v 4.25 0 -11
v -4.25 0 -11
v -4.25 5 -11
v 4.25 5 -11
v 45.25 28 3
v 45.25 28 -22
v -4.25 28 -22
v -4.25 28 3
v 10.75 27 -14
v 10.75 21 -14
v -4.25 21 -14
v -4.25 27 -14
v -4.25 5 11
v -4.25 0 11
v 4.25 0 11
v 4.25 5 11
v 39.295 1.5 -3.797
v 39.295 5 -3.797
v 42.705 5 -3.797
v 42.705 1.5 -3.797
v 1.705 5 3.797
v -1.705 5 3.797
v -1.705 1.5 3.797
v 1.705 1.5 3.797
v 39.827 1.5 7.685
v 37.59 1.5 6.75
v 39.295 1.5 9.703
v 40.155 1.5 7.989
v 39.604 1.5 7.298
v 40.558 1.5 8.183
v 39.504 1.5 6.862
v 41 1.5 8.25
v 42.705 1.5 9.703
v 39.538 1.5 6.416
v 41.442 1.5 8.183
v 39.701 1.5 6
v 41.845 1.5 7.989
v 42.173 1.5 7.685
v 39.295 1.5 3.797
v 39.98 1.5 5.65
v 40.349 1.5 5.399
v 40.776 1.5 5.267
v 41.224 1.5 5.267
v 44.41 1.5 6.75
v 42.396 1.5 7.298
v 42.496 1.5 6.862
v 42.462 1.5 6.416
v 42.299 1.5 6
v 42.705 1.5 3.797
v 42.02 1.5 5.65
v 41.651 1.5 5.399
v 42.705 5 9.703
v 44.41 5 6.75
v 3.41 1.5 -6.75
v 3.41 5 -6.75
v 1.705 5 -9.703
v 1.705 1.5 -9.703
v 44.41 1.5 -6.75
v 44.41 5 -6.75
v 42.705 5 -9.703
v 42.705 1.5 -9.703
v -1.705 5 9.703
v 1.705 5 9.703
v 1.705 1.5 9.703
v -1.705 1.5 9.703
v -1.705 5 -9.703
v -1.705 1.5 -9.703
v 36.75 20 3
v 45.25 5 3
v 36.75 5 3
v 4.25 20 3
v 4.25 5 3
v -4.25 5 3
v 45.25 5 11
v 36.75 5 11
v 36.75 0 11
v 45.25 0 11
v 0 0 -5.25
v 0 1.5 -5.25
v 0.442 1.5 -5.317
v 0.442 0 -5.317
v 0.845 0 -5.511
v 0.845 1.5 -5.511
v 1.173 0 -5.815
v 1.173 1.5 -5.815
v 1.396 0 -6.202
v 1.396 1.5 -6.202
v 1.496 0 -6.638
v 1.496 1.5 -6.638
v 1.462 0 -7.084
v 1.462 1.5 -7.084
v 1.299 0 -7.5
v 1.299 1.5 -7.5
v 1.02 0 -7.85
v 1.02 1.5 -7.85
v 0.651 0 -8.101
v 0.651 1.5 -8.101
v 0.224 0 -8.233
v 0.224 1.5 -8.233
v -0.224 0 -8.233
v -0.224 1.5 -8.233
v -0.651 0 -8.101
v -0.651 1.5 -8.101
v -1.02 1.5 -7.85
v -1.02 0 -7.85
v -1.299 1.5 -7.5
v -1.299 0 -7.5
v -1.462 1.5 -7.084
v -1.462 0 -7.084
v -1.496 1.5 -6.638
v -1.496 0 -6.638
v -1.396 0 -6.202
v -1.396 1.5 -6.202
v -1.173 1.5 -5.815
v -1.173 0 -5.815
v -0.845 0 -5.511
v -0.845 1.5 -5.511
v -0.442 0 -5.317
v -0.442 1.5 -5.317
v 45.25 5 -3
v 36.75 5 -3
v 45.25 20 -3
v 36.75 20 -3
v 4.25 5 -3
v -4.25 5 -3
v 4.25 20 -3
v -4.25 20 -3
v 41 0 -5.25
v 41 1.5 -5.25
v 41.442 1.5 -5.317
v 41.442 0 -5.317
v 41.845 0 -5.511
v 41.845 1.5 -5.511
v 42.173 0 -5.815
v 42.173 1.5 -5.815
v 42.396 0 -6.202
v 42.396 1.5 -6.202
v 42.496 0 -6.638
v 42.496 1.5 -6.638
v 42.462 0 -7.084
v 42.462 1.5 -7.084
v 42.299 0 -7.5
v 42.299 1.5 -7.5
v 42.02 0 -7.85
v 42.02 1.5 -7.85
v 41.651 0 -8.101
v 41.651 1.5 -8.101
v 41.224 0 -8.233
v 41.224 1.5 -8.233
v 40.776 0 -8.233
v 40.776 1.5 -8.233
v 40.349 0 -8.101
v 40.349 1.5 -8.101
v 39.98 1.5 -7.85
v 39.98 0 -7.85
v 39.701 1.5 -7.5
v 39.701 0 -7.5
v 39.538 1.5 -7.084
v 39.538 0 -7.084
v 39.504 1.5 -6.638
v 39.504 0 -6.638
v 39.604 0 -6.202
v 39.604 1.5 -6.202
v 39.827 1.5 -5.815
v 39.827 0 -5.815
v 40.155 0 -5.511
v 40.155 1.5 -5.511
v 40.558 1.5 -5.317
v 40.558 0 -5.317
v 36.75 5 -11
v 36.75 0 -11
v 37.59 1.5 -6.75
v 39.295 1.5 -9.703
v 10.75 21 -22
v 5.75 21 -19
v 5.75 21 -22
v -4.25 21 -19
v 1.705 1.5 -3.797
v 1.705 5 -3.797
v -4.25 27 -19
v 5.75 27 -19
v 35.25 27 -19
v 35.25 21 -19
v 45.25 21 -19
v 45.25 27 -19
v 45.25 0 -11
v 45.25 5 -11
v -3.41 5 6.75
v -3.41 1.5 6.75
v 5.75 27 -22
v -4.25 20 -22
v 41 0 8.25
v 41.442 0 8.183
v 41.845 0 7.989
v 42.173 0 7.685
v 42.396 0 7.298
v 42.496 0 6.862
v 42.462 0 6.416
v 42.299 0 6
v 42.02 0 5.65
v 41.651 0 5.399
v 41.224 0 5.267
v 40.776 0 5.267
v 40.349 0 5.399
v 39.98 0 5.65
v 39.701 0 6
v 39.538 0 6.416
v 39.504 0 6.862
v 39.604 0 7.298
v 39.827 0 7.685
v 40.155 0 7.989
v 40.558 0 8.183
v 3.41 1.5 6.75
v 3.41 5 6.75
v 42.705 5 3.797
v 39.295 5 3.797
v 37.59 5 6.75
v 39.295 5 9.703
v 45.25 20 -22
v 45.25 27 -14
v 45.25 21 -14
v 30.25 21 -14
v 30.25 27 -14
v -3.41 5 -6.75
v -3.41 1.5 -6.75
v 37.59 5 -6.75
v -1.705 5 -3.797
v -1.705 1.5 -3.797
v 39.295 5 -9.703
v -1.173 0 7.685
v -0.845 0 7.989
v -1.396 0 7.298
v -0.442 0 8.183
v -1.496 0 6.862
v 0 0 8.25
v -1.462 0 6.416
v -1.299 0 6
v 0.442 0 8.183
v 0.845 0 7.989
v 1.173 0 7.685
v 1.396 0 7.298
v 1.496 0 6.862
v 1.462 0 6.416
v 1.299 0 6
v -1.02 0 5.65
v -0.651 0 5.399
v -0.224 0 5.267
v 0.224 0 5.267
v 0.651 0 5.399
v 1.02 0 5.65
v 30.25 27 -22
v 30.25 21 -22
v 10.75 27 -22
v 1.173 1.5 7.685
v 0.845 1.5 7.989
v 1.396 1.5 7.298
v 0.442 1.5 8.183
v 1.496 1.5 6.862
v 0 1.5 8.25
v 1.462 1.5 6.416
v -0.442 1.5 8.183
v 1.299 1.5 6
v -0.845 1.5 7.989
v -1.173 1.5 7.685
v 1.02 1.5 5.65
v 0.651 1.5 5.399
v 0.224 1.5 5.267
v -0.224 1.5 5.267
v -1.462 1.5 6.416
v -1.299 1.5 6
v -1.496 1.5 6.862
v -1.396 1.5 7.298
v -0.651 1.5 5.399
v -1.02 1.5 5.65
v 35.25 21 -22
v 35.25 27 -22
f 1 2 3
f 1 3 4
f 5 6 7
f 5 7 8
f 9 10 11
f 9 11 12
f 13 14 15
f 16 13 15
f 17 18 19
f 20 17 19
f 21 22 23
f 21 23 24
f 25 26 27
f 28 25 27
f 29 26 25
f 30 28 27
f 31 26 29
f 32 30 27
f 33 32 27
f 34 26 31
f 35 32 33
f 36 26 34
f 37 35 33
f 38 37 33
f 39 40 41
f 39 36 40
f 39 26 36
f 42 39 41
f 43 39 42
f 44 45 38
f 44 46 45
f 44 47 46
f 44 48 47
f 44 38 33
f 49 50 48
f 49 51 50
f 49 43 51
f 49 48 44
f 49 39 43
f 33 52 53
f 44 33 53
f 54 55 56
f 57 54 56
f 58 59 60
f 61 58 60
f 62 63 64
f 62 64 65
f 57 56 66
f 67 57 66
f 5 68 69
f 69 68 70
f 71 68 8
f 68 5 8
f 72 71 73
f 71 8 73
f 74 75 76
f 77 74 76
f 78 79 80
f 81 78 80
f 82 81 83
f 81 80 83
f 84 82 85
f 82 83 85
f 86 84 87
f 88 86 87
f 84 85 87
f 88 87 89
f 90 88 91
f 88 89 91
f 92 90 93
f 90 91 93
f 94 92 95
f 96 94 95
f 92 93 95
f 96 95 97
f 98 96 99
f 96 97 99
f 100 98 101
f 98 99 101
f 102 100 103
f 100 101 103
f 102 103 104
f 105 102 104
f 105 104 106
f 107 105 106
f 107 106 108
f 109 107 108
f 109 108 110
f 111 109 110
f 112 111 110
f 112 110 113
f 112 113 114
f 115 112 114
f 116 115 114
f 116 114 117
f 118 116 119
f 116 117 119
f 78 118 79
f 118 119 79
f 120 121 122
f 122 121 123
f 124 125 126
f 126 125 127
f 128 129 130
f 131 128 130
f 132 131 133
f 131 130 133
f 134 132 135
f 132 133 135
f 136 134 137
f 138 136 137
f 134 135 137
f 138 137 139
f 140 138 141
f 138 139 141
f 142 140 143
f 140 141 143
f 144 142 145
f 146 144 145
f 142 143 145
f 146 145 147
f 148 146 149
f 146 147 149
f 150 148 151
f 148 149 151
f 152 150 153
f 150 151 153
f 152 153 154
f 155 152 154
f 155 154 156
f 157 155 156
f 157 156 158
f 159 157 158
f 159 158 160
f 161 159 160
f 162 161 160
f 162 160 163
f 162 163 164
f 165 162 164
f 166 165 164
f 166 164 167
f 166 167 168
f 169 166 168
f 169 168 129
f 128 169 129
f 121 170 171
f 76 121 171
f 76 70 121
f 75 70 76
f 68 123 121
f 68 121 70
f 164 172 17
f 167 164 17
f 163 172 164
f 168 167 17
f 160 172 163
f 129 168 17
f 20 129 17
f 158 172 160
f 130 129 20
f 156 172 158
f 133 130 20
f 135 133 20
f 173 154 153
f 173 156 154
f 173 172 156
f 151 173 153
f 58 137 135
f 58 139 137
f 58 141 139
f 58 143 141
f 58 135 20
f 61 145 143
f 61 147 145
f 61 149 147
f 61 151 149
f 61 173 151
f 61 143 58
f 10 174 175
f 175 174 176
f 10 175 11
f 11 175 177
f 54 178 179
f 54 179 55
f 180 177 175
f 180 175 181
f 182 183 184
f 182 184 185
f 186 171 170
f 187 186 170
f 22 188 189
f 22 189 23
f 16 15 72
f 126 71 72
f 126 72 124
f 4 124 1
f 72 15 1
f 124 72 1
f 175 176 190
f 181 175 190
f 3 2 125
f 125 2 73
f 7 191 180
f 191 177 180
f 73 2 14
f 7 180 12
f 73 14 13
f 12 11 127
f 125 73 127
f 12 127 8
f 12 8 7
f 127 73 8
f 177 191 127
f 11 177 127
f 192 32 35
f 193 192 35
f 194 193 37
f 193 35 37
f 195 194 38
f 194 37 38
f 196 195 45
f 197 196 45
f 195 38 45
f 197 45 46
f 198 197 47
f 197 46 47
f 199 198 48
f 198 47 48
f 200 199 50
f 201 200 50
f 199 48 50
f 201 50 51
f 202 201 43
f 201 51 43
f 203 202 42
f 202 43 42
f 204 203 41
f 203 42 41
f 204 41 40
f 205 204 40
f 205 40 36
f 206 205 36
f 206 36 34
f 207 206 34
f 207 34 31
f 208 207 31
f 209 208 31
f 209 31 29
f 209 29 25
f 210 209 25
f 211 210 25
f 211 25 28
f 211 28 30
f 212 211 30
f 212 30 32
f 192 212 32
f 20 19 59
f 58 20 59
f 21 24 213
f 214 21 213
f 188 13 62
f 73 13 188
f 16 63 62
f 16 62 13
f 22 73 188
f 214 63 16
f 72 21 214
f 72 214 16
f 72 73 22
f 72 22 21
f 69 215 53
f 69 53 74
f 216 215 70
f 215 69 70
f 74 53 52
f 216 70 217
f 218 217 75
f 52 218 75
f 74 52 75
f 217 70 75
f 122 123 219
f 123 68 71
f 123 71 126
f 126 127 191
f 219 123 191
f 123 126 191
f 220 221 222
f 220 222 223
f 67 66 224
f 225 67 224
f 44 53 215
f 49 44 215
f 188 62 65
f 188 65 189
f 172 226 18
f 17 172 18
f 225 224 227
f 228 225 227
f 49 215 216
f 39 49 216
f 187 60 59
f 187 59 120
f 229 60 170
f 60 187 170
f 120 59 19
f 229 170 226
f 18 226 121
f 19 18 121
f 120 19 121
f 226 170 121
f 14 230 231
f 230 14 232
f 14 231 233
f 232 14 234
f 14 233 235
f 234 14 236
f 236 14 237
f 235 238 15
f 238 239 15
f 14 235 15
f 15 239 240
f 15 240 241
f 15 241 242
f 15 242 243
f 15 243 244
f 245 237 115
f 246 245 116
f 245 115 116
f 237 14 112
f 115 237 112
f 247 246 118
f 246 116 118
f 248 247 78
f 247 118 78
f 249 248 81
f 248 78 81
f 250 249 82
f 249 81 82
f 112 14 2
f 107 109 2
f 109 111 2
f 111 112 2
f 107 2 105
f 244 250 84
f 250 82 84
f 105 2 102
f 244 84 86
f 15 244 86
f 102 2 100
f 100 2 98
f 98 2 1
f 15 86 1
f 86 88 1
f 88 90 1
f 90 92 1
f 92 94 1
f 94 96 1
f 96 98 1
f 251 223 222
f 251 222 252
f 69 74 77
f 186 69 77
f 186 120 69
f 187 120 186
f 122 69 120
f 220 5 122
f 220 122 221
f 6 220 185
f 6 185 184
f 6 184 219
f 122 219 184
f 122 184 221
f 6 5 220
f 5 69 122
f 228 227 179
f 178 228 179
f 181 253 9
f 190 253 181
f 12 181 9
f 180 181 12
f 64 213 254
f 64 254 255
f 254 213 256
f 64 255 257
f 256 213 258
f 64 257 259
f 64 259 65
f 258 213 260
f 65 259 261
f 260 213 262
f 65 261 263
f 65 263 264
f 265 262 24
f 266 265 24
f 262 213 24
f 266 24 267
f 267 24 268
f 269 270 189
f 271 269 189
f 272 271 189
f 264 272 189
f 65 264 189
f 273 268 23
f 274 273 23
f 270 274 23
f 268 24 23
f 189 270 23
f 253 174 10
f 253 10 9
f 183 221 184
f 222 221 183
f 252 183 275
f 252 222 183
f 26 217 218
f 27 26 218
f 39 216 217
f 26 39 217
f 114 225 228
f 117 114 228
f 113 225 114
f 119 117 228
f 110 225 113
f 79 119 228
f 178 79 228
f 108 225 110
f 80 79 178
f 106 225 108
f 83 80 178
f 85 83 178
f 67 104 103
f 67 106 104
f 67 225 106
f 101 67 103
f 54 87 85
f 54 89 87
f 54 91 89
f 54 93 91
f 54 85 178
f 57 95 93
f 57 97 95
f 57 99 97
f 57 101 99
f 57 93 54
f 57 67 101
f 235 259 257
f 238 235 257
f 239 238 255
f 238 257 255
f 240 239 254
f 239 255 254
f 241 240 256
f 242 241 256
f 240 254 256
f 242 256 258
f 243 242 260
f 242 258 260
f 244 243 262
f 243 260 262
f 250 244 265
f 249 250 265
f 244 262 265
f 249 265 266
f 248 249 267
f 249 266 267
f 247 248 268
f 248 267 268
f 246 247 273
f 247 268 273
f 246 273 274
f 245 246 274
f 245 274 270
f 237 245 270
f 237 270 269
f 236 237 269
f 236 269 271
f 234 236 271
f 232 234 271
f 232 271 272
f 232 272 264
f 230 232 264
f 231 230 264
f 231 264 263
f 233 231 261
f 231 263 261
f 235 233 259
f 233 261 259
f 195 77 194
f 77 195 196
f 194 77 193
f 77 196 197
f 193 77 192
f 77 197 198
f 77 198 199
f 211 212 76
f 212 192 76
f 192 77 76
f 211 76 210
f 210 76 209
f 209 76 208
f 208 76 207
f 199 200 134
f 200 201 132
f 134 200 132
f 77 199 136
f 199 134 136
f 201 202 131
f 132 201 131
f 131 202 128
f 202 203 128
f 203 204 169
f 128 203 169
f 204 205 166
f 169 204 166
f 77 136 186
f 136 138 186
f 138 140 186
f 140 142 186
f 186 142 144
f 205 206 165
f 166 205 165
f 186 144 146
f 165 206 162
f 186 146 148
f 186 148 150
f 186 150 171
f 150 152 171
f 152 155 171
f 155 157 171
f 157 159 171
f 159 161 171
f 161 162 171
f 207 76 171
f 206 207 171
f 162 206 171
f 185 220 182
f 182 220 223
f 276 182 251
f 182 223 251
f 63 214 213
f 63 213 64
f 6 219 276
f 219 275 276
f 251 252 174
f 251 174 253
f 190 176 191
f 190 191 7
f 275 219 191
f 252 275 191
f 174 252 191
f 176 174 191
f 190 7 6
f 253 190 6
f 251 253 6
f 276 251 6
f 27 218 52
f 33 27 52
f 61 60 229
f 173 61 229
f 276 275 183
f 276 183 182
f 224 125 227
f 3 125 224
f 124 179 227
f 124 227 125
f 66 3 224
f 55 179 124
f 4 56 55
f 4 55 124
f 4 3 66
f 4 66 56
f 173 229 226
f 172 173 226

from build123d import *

# Parameters (mm, degrees)
SKETCH1_W            = 8.5
SKETCH1_H            = 22
BOSS_EXTRUDE1_DEPTH  = 5
CUT_EXTRUDE1_DEPTH   = 3.5
SKETCH3_R            = 1.5
CUT_EXTRUDE2_DEPTH   = 1.5
SKETCH4_W            = 8.5
SKETCH4_H            = 6
BOSS_EXTRUDE2_DEPTH  = 23
SKETCH7_W            = 8.5
SKETCH7_H            = 22
BOSS_EXTRUDE4_DEPTH  = 5
CUT_EXTRUDE3_DEPTH   = 3.5
SKETCH9_R            = 1.5
CUT_EXTRUDE4_DEPTH   = 3.5
SKETCH10_W           = 8.5
SKETCH10_H           = 6
BOSS_EXTRUDE5_DEPTH  = 23
SKETCH6_W            = 6
SKETCH6_H            = 8
BOSS_EXTRUDE6_DEPTH  = 30.5
SKETCH11_W           = 47.5
SKETCH11_H           = 8
BOSS_EXTRUDE7_DEPTH  = 13.5
SKETCH12_W           = 47.5
SKETCH12_H           = 8
BOSS_EXTRUDE8_DEPTH  = 5.5
SKETCH13_W           = 5
SKETCH13_H           = 6
CUT_EXTRUDE5_DEPTH   = 15
SKETCH14_W           = 5
SKETCH14_H           = 6
CUT_EXTRUDE6_DEPTH   = 4
SKETCH15_W           = 5
SKETCH15_H           = 6
CUT_EXTRUDE7_DEPTH   = 15
SKETCH16_W           = 5
SKETCH16_H           = 6
CUT_EXTRUDE8_DEPTH   = 4
SKETCH17_W           = 5
SKETCH17_H           = 6
BOSS_EXTRUDE9_DEPTH  = 2
SKETCH18_W           = 10.5
SKETCH18_H           = 8
BOSS_EXTRUDE10_DEPTH = 5
CUT_EXTRUDE9_DEPTH   = 2
SKETCH23_R           = 1.5
CUT_EXTRUDE10_DEPTH  = 3.5
CUT_EXTRUDE11_REACH  = 58.867
SKETCH24_R           = 1.5
SKETCH25_W           = 5
SKETCH25_H           = 6
BOSS_EXTRUDE11_DEPTH = 2


with BuildPart() as part:
    # Sketch1 → Boss-Extrude1 (new body)
    with BuildSketch(Plane(origin=(0, 0, 0), x_dir=(1, 0, 0), z_dir=(0, 1, 0))):
        Rectangle(SKETCH1_W, SKETCH1_H)
    extrude(amount=BOSS_EXTRUDE1_DEPTH)

    # Sketch2 → Cut-Extrude1 (cut)
    with BuildSketch(Plane(origin=(0, 5, 0), x_dir=(1, 0, 0), z_dir=(0, 1, 0))):
        Polygon((-1.705, 9.703146627), (-3.41, 6.75), (-1.705, 3.796853373), (1.705, 3.796853373), (3.41, 6.75), (1.705, 9.703146627), align=None)
        Polygon((1.705, -9.703146627), (-1.705, -9.703146627), (-3.41, -6.75), (-1.705, -3.796853373), (1.705, -3.796853373), (3.41, -6.75), align=None)
    extrude(amount=-CUT_EXTRUDE1_DEPTH, mode=Mode.SUBTRACT)

    # Sketch3 → Cut-Extrude2 (cut)
    with BuildSketch(Plane(origin=(0, 1.5, 0), x_dir=(1, 0, 0), z_dir=(0, 1, 0))):
        with Locations(Location((0, 6.75, 0), (0, 0, 270))):
            Circle(SKETCH3_R)
        with Locations(Location((0, -6.75, 0), (0, 0, 270))):
            Circle(SKETCH3_R)
        with Locations((39, 6.75)):
            Circle(SKETCH3_R)
        with Locations((39, -6.75)):
            Circle(SKETCH3_R)
    extrude(amount=-CUT_EXTRUDE2_DEPTH, mode=Mode.SUBTRACT)

    # Sketch4 → Boss-Extrude2 (add)
    with BuildSketch(Plane(origin=(0, 5, 0), x_dir=(1, 0, 0), z_dir=(0, 1, 0))):
        Rectangle(SKETCH4_W, SKETCH4_H)
    extrude(amount=BOSS_EXTRUDE2_DEPTH)



with BuildPart() as body_2:
    # Sketch7 → Boss-Extrude4 (new body)
    with BuildSketch(Plane(origin=(0, 0, 0), x_dir=(1, 0, 0), z_dir=(0, 1, 0))):
        with Locations((39, 0)):
            Rectangle(SKETCH7_W, SKETCH7_H)
    extrude(amount=BOSS_EXTRUDE4_DEPTH)

    # Sketch8 → Cut-Extrude3 (cut)
    with BuildSketch(Plane(origin=(0, 5, 0), x_dir=(1, 0, 0), z_dir=(0, 1, 0))):
        Polygon((40.705, 9.703146627), (37.295, 9.703146627), (35.59, 6.75), (37.295, 3.796853373), (40.705, 3.796853373), (42.41, 6.75), align=None)
        Polygon((40.705, -3.796853373), (37.295, -3.796853373), (35.59, -6.75), (37.295, -9.703146627), (40.705, -9.703146627), (42.41, -6.75), align=None)
    extrude(amount=-CUT_EXTRUDE3_DEPTH, mode=Mode.SUBTRACT)

    # Sketch9 → Cut-Extrude4 (cut)
    with BuildSketch(Plane(origin=(0, 1.5, 0), x_dir=(1, 0, 0), z_dir=(0, 1, 0))):
        with Locations(Location((39, 6.75, 0), (0, 0, 270))):
            Circle(SKETCH9_R)
        with Locations(Location((39, -6.75, 0), (0, 0, 270))):
            Circle(SKETCH9_R)
    extrude(amount=-CUT_EXTRUDE4_DEPTH, mode=Mode.SUBTRACT)

    # Sketch10 → Boss-Extrude5 (add)
    with BuildSketch(Plane(origin=(0, 5, 0), x_dir=(1, 0, 0), z_dir=(0, 1, 0))):
        with Locations((39, 0)):
            Rectangle(SKETCH10_W, SKETCH10_H)
    extrude(amount=BOSS_EXTRUDE5_DEPTH)


with BuildPart() as part_1:
    add(part.part)

    add(body_2.part)  # Boss-Extrude6 merges body 2
    # Sketch6 → Boss-Extrude6 (add)
    with BuildSketch(Plane(origin=(4.25, 0, 0), x_dir=(0, 0, -1), z_dir=(1, 0, 0))):
        with Locations((0, 24)):
            Rectangle(SKETCH6_W, SKETCH6_H)
    extrude(amount=BOSS_EXTRUDE6_DEPTH)

    # Sketch11 → Boss-Extrude7 (add)
    with BuildSketch(Plane(origin=(0, 0, -3), x_dir=(-1, 0, 0), z_dir=(0, 0, -1))):
        with Locations((-19.5, 24)):
            Rectangle(SKETCH11_W, SKETCH11_H)
    extrude(amount=BOSS_EXTRUDE7_DEPTH)

    # Sketch12 → Boss-Extrude8 (add)
    with BuildSketch(Plane(origin=(0, 0, -16.5), x_dir=(-1, 0, 0), z_dir=(0, 0, -1))):
        with Locations((-19.5, 24)):
            Rectangle(SKETCH12_W, SKETCH12_H)
    extrude(amount=BOSS_EXTRUDE8_DEPTH)

    # Sketch13 → Cut-Extrude5 (cut)
    with BuildSketch(Plane.ZY.offset(4.25)):
        with Locations((-16.5, 24)):
            Rectangle(SKETCH13_W, SKETCH13_H)
    extrude(amount=-CUT_EXTRUDE5_DEPTH, mode=Mode.SUBTRACT)

    # Sketch14 → Cut-Extrude6 (cut)
    with BuildSketch(Plane(origin=(0, 0, -22), x_dir=(-1, 0, 0), z_dir=(0, 0, -1))):
        with Locations((-8.25, 24)):
            Rectangle(SKETCH14_W, SKETCH14_H)
    extrude(amount=-CUT_EXTRUDE6_DEPTH, mode=Mode.SUBTRACT)

    # Sketch15 → Cut-Extrude7 (cut)
    with BuildSketch(Plane(origin=(43.25, 0, 0), x_dir=(0, 0, -1), z_dir=(1, 0, 0))):
        with Locations((16.5, 24)):
            Rectangle(SKETCH15_W, SKETCH15_H)
    extrude(amount=-CUT_EXTRUDE7_DEPTH, mode=Mode.SUBTRACT)

    # Sketch16 → Cut-Extrude8 (cut)
    with BuildSketch(Plane(origin=(0, 0, -22), x_dir=(-1, 0, 0), z_dir=(0, 0, -1))):
        with Locations((-32.75, 24)):
            Rectangle(SKETCH16_W, SKETCH16_H)
    extrude(amount=-CUT_EXTRUDE8_DEPTH, mode=Mode.SUBTRACT)

    # Sketch17 → Boss-Extrude9 (add)
    with BuildSketch(Plane(origin=(43.25, 0, 0), x_dir=(0, 0, -1), z_dir=(1, 0, 0))):
        Polygon((-3, 5), (-11, 5), (-11, 0), (11, 0), (11, 5), (3, 5), (3, 20), (22, 20), (22, 28), (-3, 28), align=None)
        with Locations((16.5, 24)):
            Rectangle(SKETCH17_W, SKETCH17_H, mode=Mode.SUBTRACT)
    extrude(amount=BOSS_EXTRUDE9_DEPTH)

    # Sketch18 → Boss-Extrude10 (add)
    with BuildSketch(Plane(origin=(0, 5, 0), x_dir=(1, 0, 0), z_dir=(0, 1, 0))):
        with Locations((40, -7)):
            Rectangle(SKETCH18_W, SKETCH18_H)
        with Locations((40, 7)):
            Rectangle(SKETCH18_W, SKETCH18_H)
    extrude(amount=-BOSS_EXTRUDE10_DEPTH)

    # Sketch20 → Cut-Extrude9 (cut)
    with BuildSketch(Plane.ZY.offset(-34.75)):
        Polygon((-3, 5), (-11, 5), (-11, 0), (11, 0), (11, 5), (3, 5), (3, 20), (-3, 20), align=None)
    extrude(amount=-CUT_EXTRUDE9_DEPTH, mode=Mode.SUBTRACT)

    # Sketch23 → Cut-Extrude10 (cut)
    with BuildSketch(Plane(origin=(0, 5, 0), x_dir=(1, 0, 0), z_dir=(0, 1, 0))):
        Polygon((42.705, 9.703146627), (39.295, 9.703146627), (37.59, 6.75), (39.295, 3.796853373), (42.705, 3.796853373), (44.41, 6.75), align=None)
        with Locations((41, 6.75)):
            Circle(SKETCH23_R, mode=Mode.SUBTRACT)
        with Locations((41, 6.75)):
            Circle(SKETCH23_R)
        Polygon((39.295, -9.703146627), (42.705, -9.703146627), (44.41, -6.75), (42.705, -3.796853373), (39.295, -3.796853373), (37.59, -6.75), align=None)
        with Locations((41, -6.75)):
            Circle(SKETCH23_R, mode=Mode.SUBTRACT)
        with Locations((41, -6.75)):
            Circle(SKETCH23_R)
    extrude(amount=-CUT_EXTRUDE10_DEPTH, mode=Mode.SUBTRACT)

    # Sketch24 → Cut-Extrude11 (cut, up to next)
    with BuildSketch(Plane(origin=(0, 1.5, 0), x_dir=(1, 0, 0), z_dir=(0, 1, 0)), mode=Mode.PRIVATE) as cut_extrude11_sk1:
        with Locations(Location((41, -6.75, 0), (0, 0, 270))):
            Circle(SKETCH24_R)
    cut_extrude11_tool1 = extrude(cut_extrude11_sk1.sketch, amount=-CUT_EXTRUDE11_REACH, mode=Mode.PRIVATE) & part_1.part
    # Sketch24 → Cut-Extrude11 (cut, up to next)
    with BuildSketch(Plane(origin=(0, 1.5, 0), x_dir=(1, 0, 0), z_dir=(0, 1, 0)), mode=Mode.PRIVATE) as cut_extrude11_sk2:
        with Locations(Location((41, 6.75, 0), (0, 0, 270))):
            Circle(SKETCH24_R)
    cut_extrude11_tool2 = extrude(cut_extrude11_sk2.sketch, amount=-CUT_EXTRUDE11_REACH, mode=Mode.PRIVATE) & part_1.part
    add(cut_extrude11_tool1.solids().sort_by_distance((41, 1.5, 6.75))[0], mode=Mode.SUBTRACT)
    add(cut_extrude11_tool2.solids().sort_by_distance((41, 1.5, -6.75))[0], mode=Mode.SUBTRACT)

    # Sketch25 → Boss-Extrude11 (add)
    with BuildSketch(Plane(origin=(28.25, 0, 0), x_dir=(0, 0, -1), z_dir=(1, 0, 0))):
        with Locations((16.5, 24)):
            Rectangle(SKETCH25_W, SKETCH25_H)
    extrude(amount=BOSS_EXTRUDE11_DEPTH)


solid = part_1.part
